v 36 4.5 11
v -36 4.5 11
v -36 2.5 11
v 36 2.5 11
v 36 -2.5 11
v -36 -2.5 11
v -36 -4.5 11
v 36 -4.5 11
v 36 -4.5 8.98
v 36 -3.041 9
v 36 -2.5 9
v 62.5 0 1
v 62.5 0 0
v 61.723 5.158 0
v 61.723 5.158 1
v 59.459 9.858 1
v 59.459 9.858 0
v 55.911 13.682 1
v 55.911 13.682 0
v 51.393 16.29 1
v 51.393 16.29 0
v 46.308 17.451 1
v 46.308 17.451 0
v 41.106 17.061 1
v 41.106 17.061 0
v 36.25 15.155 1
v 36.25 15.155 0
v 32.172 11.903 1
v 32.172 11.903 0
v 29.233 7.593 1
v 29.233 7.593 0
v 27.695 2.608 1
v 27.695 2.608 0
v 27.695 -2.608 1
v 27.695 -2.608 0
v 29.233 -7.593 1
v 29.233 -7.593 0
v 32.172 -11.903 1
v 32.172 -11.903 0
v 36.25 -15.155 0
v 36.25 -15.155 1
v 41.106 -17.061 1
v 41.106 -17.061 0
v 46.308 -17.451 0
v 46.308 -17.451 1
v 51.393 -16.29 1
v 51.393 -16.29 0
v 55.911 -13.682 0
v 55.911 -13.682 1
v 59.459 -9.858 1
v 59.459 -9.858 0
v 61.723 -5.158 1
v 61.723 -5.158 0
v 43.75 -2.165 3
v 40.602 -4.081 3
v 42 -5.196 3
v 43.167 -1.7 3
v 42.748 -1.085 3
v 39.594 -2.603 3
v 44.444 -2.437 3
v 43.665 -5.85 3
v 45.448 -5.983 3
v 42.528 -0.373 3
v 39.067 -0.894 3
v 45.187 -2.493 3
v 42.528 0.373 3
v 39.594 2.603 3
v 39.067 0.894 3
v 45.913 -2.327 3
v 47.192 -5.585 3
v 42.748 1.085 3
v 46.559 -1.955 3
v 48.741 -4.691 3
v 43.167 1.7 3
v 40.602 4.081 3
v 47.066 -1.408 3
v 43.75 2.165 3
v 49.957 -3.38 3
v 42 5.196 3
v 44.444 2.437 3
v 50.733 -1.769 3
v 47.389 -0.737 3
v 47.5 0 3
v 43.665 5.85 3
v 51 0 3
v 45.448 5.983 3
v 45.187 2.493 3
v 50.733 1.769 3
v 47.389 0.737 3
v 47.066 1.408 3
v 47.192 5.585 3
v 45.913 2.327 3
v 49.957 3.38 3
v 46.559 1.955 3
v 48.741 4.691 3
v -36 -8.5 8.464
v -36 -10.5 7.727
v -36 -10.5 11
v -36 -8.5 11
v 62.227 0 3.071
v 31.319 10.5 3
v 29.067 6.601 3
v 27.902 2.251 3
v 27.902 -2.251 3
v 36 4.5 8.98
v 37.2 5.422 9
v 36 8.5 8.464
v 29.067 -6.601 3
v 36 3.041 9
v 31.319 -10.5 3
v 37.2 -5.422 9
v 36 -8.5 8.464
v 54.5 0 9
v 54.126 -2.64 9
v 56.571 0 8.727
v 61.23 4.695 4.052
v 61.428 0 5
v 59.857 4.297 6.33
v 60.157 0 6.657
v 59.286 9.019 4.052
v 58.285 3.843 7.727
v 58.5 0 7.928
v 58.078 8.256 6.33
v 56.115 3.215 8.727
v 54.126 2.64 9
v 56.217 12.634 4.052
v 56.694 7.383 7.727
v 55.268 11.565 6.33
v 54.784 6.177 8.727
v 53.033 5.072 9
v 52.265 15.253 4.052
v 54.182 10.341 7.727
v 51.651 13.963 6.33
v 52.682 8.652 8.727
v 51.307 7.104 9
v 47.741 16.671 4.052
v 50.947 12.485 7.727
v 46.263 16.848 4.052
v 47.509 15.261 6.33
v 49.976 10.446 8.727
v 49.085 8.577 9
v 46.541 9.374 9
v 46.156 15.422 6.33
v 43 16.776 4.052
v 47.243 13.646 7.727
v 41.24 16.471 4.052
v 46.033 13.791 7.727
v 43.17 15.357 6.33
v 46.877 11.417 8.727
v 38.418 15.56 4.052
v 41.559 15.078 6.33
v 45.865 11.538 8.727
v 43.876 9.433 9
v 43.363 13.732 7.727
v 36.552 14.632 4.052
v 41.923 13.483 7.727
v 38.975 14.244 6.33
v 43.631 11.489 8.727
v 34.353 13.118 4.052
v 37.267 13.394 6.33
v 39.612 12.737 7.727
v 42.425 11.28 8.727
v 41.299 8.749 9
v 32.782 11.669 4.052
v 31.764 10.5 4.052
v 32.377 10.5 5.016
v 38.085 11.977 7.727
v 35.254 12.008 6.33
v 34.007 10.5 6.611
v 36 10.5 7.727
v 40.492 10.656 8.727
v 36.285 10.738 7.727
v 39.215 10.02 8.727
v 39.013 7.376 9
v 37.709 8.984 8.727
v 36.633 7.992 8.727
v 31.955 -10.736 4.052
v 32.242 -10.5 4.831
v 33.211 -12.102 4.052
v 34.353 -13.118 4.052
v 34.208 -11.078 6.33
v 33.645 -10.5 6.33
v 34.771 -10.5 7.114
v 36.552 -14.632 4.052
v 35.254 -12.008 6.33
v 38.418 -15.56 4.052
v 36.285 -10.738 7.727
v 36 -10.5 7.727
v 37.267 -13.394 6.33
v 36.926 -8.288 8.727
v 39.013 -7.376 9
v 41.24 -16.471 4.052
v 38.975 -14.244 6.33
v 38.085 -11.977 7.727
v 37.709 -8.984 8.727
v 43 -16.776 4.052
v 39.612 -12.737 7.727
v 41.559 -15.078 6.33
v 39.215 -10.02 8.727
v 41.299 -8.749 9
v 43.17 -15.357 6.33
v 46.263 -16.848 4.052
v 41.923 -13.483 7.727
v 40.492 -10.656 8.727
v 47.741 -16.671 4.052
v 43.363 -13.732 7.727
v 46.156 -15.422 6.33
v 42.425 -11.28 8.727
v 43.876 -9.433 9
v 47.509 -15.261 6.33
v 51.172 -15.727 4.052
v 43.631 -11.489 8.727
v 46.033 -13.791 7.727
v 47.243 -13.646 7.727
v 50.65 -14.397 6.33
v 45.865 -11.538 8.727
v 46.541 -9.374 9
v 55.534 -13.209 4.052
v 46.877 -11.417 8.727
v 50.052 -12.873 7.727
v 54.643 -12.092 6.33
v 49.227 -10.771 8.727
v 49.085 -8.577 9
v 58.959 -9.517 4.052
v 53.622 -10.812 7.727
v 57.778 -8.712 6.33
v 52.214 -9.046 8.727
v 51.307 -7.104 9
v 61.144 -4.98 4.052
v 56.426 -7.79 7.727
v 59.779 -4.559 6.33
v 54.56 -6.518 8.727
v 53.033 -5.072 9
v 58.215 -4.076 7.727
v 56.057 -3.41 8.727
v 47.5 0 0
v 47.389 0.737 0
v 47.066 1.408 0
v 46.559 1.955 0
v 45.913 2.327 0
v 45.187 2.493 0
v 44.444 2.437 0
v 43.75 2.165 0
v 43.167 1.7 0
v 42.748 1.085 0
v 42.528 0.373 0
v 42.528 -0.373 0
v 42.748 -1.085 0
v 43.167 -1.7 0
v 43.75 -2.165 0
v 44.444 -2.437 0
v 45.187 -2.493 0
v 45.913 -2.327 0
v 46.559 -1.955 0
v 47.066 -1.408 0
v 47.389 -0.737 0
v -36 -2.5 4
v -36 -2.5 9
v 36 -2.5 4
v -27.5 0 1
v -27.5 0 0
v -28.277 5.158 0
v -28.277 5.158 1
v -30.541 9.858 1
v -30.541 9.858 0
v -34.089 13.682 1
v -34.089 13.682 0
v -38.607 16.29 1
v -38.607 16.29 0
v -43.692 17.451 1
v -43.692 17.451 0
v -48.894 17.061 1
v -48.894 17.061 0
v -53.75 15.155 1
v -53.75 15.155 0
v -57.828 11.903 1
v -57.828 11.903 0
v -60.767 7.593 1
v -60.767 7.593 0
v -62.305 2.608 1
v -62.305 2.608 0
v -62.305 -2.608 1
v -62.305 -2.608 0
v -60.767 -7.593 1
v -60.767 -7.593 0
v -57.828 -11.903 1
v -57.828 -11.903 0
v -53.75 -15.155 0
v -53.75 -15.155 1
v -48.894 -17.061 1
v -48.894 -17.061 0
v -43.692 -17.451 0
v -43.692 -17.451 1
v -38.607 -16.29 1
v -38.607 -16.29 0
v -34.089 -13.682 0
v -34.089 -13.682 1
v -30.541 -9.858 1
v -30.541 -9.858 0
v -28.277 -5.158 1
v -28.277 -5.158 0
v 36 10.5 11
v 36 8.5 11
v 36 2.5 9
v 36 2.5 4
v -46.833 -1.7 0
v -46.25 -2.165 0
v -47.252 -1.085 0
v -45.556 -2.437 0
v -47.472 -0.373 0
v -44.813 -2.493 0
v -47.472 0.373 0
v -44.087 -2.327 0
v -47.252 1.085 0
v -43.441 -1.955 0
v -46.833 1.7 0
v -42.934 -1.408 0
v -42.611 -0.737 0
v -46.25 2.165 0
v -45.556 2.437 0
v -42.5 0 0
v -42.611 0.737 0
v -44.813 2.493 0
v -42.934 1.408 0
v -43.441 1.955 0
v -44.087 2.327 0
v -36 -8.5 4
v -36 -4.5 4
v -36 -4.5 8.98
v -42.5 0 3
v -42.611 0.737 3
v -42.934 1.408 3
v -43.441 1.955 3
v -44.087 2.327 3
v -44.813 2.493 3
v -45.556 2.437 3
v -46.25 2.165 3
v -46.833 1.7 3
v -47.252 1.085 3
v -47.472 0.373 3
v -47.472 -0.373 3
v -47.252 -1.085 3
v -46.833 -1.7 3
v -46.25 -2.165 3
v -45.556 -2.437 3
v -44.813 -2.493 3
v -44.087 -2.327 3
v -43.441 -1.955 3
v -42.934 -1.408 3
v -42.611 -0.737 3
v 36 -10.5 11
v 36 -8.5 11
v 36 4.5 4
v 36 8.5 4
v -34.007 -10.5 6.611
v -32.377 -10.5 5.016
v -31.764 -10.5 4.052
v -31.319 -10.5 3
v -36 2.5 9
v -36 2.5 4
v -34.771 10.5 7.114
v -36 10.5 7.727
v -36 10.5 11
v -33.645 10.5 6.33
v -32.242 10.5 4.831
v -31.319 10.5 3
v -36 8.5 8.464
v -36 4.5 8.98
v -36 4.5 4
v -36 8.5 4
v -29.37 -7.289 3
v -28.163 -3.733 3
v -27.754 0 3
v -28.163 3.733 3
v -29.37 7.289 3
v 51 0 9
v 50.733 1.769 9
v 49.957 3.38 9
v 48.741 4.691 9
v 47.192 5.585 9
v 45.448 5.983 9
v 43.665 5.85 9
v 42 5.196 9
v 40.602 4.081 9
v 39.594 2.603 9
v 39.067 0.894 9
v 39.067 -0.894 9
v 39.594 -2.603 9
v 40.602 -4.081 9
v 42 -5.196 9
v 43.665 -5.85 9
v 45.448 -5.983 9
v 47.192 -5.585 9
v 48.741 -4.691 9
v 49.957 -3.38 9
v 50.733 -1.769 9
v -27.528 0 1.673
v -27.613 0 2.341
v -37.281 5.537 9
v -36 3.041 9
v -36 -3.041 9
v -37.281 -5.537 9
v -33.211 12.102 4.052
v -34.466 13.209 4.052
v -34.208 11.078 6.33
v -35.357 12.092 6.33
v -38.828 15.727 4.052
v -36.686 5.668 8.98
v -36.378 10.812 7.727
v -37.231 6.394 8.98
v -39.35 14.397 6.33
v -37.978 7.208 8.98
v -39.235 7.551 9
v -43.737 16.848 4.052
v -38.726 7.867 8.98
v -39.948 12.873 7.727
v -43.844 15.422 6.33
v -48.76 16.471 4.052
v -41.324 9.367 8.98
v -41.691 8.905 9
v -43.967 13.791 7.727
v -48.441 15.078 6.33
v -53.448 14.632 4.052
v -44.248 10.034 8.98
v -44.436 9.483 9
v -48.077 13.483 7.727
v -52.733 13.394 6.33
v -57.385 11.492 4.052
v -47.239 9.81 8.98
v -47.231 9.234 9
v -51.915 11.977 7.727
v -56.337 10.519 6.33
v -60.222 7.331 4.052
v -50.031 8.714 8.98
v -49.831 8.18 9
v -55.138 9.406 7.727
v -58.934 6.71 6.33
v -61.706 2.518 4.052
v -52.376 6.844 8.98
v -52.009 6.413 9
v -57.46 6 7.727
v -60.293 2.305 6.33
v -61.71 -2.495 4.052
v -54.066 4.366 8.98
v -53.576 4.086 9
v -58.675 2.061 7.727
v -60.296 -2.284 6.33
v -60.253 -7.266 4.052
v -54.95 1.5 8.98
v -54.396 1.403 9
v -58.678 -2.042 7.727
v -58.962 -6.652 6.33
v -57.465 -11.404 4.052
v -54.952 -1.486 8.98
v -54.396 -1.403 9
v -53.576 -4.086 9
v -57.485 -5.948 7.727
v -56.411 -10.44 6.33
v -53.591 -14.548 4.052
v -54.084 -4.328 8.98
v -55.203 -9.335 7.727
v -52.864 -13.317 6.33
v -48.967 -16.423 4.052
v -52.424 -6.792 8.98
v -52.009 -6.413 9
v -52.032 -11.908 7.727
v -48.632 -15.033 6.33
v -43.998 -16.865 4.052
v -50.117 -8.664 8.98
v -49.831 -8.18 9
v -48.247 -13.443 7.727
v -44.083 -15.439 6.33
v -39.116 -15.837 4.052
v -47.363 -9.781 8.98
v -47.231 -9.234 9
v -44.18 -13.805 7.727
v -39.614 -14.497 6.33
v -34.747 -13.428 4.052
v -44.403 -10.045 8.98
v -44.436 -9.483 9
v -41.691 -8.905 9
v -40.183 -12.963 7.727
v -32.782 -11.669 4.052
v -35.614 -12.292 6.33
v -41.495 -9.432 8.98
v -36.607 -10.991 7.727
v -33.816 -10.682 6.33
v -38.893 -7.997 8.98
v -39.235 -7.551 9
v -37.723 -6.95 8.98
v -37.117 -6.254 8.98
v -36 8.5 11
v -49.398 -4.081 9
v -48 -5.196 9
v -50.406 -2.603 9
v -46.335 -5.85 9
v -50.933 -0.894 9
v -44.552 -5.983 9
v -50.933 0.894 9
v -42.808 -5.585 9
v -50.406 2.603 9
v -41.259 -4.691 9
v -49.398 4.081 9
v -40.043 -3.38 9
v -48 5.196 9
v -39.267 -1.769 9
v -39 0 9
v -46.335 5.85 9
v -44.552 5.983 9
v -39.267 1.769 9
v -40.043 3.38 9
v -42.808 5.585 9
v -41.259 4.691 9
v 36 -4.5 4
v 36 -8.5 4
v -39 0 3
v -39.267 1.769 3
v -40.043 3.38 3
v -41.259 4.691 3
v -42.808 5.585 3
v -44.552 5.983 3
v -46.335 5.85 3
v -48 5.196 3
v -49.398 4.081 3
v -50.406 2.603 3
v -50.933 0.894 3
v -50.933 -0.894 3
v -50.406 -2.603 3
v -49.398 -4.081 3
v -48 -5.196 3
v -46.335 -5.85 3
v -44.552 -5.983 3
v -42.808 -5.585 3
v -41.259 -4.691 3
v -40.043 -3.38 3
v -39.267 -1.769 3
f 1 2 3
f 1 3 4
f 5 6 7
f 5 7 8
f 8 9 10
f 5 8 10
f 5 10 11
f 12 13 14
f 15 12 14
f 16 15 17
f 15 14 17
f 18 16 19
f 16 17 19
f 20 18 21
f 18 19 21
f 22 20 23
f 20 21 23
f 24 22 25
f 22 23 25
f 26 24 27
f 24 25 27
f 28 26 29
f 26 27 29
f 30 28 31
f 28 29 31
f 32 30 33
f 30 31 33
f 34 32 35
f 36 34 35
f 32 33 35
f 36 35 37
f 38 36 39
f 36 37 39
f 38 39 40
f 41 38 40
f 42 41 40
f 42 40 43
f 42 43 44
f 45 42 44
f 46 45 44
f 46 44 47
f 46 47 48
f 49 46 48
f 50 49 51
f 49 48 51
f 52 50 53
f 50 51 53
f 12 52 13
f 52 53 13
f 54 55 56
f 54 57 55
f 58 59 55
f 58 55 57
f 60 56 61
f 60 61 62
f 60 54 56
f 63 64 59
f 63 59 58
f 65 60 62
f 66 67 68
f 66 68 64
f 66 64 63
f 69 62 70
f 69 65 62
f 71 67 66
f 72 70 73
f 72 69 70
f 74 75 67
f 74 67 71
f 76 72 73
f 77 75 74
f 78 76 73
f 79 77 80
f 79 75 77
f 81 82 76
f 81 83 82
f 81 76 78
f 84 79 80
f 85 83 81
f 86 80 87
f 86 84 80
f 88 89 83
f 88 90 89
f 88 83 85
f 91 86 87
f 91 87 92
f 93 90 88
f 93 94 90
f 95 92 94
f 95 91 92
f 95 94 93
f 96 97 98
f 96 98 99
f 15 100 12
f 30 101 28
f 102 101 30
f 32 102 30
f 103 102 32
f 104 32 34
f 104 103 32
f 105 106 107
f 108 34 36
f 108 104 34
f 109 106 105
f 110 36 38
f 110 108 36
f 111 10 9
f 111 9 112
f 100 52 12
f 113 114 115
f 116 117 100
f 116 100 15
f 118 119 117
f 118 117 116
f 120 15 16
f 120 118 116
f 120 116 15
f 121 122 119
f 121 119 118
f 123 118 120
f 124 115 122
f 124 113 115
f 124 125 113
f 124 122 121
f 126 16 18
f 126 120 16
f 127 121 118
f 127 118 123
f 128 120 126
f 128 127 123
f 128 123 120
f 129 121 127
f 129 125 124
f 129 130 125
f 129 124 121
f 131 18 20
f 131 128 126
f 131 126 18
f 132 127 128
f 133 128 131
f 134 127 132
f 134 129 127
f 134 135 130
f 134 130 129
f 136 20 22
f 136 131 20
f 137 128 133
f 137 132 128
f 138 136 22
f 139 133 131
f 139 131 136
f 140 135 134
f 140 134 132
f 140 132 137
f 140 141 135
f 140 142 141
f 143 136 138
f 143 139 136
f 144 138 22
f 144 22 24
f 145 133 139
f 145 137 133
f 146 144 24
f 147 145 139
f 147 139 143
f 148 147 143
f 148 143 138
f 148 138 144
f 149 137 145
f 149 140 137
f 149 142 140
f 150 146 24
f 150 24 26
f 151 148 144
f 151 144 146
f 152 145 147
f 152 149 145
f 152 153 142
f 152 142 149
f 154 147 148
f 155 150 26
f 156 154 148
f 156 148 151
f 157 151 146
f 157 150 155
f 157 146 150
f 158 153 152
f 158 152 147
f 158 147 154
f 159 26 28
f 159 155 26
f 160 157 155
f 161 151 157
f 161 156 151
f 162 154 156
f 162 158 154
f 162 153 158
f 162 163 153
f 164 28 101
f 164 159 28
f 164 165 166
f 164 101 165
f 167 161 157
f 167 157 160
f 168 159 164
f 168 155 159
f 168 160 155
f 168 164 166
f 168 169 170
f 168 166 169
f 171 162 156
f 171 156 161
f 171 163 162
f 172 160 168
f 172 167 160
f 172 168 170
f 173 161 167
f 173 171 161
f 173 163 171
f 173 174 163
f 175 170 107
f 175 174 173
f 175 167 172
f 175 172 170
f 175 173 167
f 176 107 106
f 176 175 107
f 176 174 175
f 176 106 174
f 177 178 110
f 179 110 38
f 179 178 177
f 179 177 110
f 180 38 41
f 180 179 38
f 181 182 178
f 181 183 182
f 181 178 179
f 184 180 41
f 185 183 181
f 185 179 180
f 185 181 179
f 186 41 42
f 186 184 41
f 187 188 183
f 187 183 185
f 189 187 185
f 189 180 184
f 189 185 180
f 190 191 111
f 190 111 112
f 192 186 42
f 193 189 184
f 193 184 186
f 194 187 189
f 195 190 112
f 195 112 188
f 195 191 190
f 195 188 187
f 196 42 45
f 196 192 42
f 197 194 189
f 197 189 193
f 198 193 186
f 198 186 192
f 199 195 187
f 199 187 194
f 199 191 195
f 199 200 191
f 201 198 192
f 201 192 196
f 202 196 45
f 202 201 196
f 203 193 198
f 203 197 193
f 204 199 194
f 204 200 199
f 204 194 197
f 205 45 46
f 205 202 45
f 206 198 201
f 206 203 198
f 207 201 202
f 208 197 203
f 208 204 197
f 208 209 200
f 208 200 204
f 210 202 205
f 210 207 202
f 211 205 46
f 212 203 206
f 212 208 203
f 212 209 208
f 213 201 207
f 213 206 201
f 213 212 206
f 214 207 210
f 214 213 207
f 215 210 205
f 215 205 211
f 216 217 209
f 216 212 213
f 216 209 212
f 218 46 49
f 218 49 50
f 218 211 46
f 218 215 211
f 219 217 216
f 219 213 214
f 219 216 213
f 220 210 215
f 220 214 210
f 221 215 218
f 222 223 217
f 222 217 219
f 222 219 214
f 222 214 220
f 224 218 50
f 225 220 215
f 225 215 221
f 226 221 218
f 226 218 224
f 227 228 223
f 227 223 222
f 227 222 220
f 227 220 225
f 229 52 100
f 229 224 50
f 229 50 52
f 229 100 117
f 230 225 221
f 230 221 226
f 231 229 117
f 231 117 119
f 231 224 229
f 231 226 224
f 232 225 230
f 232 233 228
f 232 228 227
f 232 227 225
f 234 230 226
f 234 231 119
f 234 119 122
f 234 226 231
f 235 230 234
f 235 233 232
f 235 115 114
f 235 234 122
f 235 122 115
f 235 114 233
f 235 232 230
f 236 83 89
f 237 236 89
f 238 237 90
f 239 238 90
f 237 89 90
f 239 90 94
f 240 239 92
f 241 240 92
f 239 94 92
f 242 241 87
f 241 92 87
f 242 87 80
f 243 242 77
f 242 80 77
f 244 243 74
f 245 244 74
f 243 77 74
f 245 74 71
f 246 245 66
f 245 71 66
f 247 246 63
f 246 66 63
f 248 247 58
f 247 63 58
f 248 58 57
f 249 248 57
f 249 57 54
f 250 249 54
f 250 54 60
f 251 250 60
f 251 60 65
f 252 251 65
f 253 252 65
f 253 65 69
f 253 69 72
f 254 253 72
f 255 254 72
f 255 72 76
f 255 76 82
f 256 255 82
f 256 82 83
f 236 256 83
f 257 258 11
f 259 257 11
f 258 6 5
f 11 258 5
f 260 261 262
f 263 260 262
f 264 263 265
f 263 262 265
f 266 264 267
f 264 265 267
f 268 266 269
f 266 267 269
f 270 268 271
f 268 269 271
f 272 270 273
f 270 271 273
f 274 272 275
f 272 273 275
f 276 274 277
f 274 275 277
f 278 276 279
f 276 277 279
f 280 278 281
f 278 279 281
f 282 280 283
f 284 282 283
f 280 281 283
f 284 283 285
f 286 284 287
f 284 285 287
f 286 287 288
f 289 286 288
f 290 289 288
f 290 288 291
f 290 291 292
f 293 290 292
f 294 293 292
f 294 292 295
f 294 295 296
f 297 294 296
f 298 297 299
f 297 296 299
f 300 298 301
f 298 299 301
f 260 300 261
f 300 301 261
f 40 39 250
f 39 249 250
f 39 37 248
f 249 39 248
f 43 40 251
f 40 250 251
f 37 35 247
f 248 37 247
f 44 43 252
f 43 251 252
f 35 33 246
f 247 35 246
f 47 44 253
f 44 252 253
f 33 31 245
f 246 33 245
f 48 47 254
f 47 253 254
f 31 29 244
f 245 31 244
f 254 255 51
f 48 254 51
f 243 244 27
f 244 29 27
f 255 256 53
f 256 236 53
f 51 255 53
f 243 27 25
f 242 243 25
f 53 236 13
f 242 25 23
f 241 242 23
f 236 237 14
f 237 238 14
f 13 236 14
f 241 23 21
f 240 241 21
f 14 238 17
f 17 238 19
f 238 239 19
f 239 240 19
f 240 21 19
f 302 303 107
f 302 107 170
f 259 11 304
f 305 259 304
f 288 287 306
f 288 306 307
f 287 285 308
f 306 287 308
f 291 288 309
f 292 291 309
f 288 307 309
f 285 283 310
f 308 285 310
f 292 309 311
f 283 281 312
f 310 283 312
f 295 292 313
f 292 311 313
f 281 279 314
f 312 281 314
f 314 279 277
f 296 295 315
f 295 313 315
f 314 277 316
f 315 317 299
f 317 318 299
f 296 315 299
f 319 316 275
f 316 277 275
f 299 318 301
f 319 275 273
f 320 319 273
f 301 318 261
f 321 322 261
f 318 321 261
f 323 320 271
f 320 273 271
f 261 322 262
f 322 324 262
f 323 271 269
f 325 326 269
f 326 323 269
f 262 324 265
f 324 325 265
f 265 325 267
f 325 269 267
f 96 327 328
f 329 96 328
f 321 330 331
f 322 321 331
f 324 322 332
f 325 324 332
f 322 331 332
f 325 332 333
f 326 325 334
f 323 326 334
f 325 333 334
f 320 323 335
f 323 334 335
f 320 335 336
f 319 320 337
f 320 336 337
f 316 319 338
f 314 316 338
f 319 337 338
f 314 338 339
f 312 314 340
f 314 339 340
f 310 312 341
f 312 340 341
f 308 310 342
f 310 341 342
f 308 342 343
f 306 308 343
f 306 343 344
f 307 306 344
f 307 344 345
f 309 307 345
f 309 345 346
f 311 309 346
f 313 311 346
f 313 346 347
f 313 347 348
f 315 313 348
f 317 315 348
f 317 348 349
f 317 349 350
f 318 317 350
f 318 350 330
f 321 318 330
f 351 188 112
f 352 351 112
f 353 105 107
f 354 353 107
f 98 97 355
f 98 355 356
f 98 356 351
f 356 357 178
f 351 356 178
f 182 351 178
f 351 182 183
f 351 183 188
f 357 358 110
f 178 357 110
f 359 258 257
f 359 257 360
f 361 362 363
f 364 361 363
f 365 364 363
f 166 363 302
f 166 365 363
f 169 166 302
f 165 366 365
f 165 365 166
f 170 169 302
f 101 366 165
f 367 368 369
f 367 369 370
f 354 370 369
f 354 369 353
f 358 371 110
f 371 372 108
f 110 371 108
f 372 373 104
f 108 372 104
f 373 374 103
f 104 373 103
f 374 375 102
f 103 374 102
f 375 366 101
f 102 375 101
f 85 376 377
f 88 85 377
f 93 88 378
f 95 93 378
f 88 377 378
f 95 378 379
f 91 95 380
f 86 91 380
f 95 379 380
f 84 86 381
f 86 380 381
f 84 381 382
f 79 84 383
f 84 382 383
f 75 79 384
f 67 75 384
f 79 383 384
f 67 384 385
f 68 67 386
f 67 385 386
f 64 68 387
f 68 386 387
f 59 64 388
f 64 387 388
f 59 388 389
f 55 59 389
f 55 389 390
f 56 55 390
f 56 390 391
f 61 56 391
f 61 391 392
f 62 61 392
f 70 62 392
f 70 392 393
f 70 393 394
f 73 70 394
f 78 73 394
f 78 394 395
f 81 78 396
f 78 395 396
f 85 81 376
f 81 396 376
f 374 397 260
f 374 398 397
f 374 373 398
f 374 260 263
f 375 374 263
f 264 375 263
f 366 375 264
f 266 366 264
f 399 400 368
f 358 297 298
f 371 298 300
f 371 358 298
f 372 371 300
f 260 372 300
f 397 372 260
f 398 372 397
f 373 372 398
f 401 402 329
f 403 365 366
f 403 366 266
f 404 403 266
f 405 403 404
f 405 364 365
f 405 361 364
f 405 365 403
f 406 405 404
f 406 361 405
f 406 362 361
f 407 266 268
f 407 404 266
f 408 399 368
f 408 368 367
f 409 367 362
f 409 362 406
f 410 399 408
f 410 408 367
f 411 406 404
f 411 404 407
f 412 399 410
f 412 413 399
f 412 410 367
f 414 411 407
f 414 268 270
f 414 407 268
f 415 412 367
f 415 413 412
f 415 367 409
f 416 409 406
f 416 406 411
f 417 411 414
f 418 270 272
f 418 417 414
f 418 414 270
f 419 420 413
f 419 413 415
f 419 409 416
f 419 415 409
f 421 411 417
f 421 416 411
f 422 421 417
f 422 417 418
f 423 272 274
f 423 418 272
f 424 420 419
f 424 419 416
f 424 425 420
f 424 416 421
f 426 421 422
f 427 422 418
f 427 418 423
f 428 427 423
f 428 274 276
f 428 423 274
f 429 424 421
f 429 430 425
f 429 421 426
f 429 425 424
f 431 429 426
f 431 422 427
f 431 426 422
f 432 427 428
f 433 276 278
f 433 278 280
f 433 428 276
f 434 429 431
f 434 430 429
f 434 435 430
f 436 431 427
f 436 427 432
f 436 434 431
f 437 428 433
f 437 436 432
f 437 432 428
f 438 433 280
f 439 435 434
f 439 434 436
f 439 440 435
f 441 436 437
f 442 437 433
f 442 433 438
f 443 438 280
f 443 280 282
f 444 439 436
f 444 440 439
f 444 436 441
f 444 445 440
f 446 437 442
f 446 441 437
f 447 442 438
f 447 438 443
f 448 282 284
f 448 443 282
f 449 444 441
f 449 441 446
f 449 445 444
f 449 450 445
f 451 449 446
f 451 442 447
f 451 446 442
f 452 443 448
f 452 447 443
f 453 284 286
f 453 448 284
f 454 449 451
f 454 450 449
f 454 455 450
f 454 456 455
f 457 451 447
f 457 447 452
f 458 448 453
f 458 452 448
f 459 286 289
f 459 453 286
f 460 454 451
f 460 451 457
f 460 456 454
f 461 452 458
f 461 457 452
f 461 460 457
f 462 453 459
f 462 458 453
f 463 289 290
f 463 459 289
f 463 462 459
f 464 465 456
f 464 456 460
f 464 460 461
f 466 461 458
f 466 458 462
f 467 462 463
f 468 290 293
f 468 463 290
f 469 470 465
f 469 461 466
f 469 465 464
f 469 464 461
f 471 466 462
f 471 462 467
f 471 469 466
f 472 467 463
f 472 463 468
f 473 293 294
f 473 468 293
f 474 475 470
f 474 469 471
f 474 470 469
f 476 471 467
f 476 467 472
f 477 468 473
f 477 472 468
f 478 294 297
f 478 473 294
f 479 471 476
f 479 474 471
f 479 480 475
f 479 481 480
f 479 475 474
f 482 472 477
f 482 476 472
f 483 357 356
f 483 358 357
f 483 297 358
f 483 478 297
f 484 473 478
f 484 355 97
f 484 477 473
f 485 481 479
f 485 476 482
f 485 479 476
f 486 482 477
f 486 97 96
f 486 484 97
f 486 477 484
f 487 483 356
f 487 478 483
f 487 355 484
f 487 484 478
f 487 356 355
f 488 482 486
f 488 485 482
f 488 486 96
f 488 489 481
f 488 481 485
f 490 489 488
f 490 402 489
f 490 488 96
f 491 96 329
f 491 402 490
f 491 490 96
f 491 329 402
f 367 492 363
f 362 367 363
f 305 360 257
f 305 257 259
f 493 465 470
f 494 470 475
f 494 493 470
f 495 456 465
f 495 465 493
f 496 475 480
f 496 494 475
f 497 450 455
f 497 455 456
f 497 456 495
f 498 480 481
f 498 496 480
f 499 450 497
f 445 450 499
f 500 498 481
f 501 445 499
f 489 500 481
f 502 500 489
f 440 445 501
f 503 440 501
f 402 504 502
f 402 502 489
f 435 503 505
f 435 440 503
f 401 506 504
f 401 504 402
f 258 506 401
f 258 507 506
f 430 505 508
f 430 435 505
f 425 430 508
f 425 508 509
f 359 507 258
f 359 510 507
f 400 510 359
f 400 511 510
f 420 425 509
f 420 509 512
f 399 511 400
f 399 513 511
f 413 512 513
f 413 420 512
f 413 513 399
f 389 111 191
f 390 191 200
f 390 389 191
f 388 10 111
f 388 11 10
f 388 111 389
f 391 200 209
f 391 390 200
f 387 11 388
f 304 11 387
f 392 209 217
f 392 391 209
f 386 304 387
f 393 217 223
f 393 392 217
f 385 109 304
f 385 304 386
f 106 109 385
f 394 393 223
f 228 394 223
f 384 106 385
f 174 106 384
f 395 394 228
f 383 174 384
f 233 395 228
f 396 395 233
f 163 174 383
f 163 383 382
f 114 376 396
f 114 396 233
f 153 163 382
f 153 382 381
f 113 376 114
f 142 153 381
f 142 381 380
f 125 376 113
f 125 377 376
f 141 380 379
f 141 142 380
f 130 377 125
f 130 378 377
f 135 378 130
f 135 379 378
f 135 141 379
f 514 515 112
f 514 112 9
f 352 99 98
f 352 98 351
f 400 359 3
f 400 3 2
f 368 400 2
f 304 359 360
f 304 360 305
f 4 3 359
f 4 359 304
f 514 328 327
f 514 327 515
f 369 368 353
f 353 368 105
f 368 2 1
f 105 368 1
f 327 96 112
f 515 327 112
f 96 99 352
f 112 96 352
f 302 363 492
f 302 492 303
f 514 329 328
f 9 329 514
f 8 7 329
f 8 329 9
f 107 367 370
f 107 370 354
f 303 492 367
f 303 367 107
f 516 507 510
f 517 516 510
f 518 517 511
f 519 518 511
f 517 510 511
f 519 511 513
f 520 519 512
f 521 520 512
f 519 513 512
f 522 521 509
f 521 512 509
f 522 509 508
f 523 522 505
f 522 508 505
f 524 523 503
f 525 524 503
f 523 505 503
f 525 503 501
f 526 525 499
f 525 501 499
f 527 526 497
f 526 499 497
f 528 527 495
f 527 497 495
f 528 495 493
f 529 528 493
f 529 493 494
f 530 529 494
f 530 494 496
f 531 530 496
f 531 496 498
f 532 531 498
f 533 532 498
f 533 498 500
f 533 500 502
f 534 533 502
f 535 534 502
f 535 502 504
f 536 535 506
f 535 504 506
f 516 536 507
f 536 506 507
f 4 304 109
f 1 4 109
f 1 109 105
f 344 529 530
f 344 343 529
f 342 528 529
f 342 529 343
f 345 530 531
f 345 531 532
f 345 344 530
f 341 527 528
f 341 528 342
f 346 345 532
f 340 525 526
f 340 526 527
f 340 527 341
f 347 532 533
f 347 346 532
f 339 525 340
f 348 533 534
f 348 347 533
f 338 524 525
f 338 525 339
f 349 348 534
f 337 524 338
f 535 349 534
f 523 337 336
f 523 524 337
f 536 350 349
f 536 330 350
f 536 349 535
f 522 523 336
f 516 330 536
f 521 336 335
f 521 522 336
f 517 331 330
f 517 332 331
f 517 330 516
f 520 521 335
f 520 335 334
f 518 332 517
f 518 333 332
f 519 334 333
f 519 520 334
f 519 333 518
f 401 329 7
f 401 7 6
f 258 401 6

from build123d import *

# Parameters (mm, degrees)
CROQUIS1_R                = 17.5
SALIENTE_EXTRUIR1_DEPTH   = 9
SALIENTE_EXTRUIR1_2_DEPTH = 9
REDONDEO1_R               = 8
REDONDEO2_R               = 8
CROQUIS5_W                = 72
CROQUIS5_H                = 21
SALIENTE_EXTRUIR2_DEPTH   = 8
CROQUIS6_W                = 72
CROQUIS6_H                = 4
CROQUIS6_H_2              = 5
CORTAR_EXTRUIR1_DEPTH     = 7
CROQUIS8_R                = 6
CORTAR_EXTRUIR2_DEPTH     = 6
CROQUIS9_R                = 2.5
CORTAR_EXTRUIR3_DEPTH     = 66.394954068


with BuildPart() as part:
    # Croquis1 → Saliente-Extruir1 (new body)
    with BuildSketch(Plane.XY):
        with Locations((45, 0)):
            Circle(CROQUIS1_R)
    extrude(amount=SALIENTE_EXTRUIR1_DEPTH)

    # Redondeo2
    redondeo2_edges = [part.edges().sort_by_distance(p)[0] for p in [
        (27.5, 0, 9),
    ]]
    fillet(redondeo2_edges, radius=REDONDEO2_R)



with BuildPart() as body_2:
    # Croquis1 → Saliente-Extruir1 2 (new body)
    with BuildSketch(Plane.XY):
        with Locations((-45, 0)):
            Circle(CROQUIS1_R)
    extrude(amount=SALIENTE_EXTRUIR1_2_DEPTH)

    # Redondeo1
    redondeo1_edges = [body_2.edges().sort_by_distance(p)[0] for p in [
        (-62.5, 0, 9),
    ]]
    fillet(redondeo1_edges, radius=REDONDEO1_R)


with BuildPart() as part_1:
    add(part.part)

    add(body_2.part)  # Saliente-Extruir2 merges body 2
    # Croquis5 → Saliente-Extruir2 (add)
    with BuildSketch(Plane.XY.offset(3)):
        Rectangle(CROQUIS5_W, CROQUIS5_H)
    extrude(amount=SALIENTE_EXTRUIR2_DEPTH)

    # Croquis6 → Cortar-Extruir1 (cut)
    with BuildSketch(Plane.XY.offset(11)):
        with Locations((0, 6.5)):
            Rectangle(CROQUIS6_W, CROQUIS6_H)
        Rectangle(CROQUIS6_W, CROQUIS6_H_2)
        with Locations((0, -6.5)):
            Rectangle(CROQUIS6_W, CROQUIS6_H)
    extrude(amount=-CORTAR_EXTRUIR1_DEPTH, mode=Mode.SUBTRACT)

    # Croquis8 → Cortar-Extruir2 (cut)
    with BuildSketch(Plane.XY.offset(9)):
        with Locations((-45, 0)):
            Circle(CROQUIS8_R)
        with Locations((45, 0)):
            Circle(CROQUIS8_R)
    extrude(amount=-CORTAR_EXTRUIR2_DEPTH, mode=Mode.SUBTRACT)

    # Croquis9 → Cortar-Extruir3 (cut, through all)
    with BuildSketch(Plane.XY.offset(3)):
        with Locations((45, 0)):
            Circle(CROQUIS9_R)
        with Locations((-45, 0)):
            Circle(CROQUIS9_R)
    extrude(amount=-CORTAR_EXTRUIR3_DEPTH, mode=Mode.SUBTRACT)


solid = part_1.part
